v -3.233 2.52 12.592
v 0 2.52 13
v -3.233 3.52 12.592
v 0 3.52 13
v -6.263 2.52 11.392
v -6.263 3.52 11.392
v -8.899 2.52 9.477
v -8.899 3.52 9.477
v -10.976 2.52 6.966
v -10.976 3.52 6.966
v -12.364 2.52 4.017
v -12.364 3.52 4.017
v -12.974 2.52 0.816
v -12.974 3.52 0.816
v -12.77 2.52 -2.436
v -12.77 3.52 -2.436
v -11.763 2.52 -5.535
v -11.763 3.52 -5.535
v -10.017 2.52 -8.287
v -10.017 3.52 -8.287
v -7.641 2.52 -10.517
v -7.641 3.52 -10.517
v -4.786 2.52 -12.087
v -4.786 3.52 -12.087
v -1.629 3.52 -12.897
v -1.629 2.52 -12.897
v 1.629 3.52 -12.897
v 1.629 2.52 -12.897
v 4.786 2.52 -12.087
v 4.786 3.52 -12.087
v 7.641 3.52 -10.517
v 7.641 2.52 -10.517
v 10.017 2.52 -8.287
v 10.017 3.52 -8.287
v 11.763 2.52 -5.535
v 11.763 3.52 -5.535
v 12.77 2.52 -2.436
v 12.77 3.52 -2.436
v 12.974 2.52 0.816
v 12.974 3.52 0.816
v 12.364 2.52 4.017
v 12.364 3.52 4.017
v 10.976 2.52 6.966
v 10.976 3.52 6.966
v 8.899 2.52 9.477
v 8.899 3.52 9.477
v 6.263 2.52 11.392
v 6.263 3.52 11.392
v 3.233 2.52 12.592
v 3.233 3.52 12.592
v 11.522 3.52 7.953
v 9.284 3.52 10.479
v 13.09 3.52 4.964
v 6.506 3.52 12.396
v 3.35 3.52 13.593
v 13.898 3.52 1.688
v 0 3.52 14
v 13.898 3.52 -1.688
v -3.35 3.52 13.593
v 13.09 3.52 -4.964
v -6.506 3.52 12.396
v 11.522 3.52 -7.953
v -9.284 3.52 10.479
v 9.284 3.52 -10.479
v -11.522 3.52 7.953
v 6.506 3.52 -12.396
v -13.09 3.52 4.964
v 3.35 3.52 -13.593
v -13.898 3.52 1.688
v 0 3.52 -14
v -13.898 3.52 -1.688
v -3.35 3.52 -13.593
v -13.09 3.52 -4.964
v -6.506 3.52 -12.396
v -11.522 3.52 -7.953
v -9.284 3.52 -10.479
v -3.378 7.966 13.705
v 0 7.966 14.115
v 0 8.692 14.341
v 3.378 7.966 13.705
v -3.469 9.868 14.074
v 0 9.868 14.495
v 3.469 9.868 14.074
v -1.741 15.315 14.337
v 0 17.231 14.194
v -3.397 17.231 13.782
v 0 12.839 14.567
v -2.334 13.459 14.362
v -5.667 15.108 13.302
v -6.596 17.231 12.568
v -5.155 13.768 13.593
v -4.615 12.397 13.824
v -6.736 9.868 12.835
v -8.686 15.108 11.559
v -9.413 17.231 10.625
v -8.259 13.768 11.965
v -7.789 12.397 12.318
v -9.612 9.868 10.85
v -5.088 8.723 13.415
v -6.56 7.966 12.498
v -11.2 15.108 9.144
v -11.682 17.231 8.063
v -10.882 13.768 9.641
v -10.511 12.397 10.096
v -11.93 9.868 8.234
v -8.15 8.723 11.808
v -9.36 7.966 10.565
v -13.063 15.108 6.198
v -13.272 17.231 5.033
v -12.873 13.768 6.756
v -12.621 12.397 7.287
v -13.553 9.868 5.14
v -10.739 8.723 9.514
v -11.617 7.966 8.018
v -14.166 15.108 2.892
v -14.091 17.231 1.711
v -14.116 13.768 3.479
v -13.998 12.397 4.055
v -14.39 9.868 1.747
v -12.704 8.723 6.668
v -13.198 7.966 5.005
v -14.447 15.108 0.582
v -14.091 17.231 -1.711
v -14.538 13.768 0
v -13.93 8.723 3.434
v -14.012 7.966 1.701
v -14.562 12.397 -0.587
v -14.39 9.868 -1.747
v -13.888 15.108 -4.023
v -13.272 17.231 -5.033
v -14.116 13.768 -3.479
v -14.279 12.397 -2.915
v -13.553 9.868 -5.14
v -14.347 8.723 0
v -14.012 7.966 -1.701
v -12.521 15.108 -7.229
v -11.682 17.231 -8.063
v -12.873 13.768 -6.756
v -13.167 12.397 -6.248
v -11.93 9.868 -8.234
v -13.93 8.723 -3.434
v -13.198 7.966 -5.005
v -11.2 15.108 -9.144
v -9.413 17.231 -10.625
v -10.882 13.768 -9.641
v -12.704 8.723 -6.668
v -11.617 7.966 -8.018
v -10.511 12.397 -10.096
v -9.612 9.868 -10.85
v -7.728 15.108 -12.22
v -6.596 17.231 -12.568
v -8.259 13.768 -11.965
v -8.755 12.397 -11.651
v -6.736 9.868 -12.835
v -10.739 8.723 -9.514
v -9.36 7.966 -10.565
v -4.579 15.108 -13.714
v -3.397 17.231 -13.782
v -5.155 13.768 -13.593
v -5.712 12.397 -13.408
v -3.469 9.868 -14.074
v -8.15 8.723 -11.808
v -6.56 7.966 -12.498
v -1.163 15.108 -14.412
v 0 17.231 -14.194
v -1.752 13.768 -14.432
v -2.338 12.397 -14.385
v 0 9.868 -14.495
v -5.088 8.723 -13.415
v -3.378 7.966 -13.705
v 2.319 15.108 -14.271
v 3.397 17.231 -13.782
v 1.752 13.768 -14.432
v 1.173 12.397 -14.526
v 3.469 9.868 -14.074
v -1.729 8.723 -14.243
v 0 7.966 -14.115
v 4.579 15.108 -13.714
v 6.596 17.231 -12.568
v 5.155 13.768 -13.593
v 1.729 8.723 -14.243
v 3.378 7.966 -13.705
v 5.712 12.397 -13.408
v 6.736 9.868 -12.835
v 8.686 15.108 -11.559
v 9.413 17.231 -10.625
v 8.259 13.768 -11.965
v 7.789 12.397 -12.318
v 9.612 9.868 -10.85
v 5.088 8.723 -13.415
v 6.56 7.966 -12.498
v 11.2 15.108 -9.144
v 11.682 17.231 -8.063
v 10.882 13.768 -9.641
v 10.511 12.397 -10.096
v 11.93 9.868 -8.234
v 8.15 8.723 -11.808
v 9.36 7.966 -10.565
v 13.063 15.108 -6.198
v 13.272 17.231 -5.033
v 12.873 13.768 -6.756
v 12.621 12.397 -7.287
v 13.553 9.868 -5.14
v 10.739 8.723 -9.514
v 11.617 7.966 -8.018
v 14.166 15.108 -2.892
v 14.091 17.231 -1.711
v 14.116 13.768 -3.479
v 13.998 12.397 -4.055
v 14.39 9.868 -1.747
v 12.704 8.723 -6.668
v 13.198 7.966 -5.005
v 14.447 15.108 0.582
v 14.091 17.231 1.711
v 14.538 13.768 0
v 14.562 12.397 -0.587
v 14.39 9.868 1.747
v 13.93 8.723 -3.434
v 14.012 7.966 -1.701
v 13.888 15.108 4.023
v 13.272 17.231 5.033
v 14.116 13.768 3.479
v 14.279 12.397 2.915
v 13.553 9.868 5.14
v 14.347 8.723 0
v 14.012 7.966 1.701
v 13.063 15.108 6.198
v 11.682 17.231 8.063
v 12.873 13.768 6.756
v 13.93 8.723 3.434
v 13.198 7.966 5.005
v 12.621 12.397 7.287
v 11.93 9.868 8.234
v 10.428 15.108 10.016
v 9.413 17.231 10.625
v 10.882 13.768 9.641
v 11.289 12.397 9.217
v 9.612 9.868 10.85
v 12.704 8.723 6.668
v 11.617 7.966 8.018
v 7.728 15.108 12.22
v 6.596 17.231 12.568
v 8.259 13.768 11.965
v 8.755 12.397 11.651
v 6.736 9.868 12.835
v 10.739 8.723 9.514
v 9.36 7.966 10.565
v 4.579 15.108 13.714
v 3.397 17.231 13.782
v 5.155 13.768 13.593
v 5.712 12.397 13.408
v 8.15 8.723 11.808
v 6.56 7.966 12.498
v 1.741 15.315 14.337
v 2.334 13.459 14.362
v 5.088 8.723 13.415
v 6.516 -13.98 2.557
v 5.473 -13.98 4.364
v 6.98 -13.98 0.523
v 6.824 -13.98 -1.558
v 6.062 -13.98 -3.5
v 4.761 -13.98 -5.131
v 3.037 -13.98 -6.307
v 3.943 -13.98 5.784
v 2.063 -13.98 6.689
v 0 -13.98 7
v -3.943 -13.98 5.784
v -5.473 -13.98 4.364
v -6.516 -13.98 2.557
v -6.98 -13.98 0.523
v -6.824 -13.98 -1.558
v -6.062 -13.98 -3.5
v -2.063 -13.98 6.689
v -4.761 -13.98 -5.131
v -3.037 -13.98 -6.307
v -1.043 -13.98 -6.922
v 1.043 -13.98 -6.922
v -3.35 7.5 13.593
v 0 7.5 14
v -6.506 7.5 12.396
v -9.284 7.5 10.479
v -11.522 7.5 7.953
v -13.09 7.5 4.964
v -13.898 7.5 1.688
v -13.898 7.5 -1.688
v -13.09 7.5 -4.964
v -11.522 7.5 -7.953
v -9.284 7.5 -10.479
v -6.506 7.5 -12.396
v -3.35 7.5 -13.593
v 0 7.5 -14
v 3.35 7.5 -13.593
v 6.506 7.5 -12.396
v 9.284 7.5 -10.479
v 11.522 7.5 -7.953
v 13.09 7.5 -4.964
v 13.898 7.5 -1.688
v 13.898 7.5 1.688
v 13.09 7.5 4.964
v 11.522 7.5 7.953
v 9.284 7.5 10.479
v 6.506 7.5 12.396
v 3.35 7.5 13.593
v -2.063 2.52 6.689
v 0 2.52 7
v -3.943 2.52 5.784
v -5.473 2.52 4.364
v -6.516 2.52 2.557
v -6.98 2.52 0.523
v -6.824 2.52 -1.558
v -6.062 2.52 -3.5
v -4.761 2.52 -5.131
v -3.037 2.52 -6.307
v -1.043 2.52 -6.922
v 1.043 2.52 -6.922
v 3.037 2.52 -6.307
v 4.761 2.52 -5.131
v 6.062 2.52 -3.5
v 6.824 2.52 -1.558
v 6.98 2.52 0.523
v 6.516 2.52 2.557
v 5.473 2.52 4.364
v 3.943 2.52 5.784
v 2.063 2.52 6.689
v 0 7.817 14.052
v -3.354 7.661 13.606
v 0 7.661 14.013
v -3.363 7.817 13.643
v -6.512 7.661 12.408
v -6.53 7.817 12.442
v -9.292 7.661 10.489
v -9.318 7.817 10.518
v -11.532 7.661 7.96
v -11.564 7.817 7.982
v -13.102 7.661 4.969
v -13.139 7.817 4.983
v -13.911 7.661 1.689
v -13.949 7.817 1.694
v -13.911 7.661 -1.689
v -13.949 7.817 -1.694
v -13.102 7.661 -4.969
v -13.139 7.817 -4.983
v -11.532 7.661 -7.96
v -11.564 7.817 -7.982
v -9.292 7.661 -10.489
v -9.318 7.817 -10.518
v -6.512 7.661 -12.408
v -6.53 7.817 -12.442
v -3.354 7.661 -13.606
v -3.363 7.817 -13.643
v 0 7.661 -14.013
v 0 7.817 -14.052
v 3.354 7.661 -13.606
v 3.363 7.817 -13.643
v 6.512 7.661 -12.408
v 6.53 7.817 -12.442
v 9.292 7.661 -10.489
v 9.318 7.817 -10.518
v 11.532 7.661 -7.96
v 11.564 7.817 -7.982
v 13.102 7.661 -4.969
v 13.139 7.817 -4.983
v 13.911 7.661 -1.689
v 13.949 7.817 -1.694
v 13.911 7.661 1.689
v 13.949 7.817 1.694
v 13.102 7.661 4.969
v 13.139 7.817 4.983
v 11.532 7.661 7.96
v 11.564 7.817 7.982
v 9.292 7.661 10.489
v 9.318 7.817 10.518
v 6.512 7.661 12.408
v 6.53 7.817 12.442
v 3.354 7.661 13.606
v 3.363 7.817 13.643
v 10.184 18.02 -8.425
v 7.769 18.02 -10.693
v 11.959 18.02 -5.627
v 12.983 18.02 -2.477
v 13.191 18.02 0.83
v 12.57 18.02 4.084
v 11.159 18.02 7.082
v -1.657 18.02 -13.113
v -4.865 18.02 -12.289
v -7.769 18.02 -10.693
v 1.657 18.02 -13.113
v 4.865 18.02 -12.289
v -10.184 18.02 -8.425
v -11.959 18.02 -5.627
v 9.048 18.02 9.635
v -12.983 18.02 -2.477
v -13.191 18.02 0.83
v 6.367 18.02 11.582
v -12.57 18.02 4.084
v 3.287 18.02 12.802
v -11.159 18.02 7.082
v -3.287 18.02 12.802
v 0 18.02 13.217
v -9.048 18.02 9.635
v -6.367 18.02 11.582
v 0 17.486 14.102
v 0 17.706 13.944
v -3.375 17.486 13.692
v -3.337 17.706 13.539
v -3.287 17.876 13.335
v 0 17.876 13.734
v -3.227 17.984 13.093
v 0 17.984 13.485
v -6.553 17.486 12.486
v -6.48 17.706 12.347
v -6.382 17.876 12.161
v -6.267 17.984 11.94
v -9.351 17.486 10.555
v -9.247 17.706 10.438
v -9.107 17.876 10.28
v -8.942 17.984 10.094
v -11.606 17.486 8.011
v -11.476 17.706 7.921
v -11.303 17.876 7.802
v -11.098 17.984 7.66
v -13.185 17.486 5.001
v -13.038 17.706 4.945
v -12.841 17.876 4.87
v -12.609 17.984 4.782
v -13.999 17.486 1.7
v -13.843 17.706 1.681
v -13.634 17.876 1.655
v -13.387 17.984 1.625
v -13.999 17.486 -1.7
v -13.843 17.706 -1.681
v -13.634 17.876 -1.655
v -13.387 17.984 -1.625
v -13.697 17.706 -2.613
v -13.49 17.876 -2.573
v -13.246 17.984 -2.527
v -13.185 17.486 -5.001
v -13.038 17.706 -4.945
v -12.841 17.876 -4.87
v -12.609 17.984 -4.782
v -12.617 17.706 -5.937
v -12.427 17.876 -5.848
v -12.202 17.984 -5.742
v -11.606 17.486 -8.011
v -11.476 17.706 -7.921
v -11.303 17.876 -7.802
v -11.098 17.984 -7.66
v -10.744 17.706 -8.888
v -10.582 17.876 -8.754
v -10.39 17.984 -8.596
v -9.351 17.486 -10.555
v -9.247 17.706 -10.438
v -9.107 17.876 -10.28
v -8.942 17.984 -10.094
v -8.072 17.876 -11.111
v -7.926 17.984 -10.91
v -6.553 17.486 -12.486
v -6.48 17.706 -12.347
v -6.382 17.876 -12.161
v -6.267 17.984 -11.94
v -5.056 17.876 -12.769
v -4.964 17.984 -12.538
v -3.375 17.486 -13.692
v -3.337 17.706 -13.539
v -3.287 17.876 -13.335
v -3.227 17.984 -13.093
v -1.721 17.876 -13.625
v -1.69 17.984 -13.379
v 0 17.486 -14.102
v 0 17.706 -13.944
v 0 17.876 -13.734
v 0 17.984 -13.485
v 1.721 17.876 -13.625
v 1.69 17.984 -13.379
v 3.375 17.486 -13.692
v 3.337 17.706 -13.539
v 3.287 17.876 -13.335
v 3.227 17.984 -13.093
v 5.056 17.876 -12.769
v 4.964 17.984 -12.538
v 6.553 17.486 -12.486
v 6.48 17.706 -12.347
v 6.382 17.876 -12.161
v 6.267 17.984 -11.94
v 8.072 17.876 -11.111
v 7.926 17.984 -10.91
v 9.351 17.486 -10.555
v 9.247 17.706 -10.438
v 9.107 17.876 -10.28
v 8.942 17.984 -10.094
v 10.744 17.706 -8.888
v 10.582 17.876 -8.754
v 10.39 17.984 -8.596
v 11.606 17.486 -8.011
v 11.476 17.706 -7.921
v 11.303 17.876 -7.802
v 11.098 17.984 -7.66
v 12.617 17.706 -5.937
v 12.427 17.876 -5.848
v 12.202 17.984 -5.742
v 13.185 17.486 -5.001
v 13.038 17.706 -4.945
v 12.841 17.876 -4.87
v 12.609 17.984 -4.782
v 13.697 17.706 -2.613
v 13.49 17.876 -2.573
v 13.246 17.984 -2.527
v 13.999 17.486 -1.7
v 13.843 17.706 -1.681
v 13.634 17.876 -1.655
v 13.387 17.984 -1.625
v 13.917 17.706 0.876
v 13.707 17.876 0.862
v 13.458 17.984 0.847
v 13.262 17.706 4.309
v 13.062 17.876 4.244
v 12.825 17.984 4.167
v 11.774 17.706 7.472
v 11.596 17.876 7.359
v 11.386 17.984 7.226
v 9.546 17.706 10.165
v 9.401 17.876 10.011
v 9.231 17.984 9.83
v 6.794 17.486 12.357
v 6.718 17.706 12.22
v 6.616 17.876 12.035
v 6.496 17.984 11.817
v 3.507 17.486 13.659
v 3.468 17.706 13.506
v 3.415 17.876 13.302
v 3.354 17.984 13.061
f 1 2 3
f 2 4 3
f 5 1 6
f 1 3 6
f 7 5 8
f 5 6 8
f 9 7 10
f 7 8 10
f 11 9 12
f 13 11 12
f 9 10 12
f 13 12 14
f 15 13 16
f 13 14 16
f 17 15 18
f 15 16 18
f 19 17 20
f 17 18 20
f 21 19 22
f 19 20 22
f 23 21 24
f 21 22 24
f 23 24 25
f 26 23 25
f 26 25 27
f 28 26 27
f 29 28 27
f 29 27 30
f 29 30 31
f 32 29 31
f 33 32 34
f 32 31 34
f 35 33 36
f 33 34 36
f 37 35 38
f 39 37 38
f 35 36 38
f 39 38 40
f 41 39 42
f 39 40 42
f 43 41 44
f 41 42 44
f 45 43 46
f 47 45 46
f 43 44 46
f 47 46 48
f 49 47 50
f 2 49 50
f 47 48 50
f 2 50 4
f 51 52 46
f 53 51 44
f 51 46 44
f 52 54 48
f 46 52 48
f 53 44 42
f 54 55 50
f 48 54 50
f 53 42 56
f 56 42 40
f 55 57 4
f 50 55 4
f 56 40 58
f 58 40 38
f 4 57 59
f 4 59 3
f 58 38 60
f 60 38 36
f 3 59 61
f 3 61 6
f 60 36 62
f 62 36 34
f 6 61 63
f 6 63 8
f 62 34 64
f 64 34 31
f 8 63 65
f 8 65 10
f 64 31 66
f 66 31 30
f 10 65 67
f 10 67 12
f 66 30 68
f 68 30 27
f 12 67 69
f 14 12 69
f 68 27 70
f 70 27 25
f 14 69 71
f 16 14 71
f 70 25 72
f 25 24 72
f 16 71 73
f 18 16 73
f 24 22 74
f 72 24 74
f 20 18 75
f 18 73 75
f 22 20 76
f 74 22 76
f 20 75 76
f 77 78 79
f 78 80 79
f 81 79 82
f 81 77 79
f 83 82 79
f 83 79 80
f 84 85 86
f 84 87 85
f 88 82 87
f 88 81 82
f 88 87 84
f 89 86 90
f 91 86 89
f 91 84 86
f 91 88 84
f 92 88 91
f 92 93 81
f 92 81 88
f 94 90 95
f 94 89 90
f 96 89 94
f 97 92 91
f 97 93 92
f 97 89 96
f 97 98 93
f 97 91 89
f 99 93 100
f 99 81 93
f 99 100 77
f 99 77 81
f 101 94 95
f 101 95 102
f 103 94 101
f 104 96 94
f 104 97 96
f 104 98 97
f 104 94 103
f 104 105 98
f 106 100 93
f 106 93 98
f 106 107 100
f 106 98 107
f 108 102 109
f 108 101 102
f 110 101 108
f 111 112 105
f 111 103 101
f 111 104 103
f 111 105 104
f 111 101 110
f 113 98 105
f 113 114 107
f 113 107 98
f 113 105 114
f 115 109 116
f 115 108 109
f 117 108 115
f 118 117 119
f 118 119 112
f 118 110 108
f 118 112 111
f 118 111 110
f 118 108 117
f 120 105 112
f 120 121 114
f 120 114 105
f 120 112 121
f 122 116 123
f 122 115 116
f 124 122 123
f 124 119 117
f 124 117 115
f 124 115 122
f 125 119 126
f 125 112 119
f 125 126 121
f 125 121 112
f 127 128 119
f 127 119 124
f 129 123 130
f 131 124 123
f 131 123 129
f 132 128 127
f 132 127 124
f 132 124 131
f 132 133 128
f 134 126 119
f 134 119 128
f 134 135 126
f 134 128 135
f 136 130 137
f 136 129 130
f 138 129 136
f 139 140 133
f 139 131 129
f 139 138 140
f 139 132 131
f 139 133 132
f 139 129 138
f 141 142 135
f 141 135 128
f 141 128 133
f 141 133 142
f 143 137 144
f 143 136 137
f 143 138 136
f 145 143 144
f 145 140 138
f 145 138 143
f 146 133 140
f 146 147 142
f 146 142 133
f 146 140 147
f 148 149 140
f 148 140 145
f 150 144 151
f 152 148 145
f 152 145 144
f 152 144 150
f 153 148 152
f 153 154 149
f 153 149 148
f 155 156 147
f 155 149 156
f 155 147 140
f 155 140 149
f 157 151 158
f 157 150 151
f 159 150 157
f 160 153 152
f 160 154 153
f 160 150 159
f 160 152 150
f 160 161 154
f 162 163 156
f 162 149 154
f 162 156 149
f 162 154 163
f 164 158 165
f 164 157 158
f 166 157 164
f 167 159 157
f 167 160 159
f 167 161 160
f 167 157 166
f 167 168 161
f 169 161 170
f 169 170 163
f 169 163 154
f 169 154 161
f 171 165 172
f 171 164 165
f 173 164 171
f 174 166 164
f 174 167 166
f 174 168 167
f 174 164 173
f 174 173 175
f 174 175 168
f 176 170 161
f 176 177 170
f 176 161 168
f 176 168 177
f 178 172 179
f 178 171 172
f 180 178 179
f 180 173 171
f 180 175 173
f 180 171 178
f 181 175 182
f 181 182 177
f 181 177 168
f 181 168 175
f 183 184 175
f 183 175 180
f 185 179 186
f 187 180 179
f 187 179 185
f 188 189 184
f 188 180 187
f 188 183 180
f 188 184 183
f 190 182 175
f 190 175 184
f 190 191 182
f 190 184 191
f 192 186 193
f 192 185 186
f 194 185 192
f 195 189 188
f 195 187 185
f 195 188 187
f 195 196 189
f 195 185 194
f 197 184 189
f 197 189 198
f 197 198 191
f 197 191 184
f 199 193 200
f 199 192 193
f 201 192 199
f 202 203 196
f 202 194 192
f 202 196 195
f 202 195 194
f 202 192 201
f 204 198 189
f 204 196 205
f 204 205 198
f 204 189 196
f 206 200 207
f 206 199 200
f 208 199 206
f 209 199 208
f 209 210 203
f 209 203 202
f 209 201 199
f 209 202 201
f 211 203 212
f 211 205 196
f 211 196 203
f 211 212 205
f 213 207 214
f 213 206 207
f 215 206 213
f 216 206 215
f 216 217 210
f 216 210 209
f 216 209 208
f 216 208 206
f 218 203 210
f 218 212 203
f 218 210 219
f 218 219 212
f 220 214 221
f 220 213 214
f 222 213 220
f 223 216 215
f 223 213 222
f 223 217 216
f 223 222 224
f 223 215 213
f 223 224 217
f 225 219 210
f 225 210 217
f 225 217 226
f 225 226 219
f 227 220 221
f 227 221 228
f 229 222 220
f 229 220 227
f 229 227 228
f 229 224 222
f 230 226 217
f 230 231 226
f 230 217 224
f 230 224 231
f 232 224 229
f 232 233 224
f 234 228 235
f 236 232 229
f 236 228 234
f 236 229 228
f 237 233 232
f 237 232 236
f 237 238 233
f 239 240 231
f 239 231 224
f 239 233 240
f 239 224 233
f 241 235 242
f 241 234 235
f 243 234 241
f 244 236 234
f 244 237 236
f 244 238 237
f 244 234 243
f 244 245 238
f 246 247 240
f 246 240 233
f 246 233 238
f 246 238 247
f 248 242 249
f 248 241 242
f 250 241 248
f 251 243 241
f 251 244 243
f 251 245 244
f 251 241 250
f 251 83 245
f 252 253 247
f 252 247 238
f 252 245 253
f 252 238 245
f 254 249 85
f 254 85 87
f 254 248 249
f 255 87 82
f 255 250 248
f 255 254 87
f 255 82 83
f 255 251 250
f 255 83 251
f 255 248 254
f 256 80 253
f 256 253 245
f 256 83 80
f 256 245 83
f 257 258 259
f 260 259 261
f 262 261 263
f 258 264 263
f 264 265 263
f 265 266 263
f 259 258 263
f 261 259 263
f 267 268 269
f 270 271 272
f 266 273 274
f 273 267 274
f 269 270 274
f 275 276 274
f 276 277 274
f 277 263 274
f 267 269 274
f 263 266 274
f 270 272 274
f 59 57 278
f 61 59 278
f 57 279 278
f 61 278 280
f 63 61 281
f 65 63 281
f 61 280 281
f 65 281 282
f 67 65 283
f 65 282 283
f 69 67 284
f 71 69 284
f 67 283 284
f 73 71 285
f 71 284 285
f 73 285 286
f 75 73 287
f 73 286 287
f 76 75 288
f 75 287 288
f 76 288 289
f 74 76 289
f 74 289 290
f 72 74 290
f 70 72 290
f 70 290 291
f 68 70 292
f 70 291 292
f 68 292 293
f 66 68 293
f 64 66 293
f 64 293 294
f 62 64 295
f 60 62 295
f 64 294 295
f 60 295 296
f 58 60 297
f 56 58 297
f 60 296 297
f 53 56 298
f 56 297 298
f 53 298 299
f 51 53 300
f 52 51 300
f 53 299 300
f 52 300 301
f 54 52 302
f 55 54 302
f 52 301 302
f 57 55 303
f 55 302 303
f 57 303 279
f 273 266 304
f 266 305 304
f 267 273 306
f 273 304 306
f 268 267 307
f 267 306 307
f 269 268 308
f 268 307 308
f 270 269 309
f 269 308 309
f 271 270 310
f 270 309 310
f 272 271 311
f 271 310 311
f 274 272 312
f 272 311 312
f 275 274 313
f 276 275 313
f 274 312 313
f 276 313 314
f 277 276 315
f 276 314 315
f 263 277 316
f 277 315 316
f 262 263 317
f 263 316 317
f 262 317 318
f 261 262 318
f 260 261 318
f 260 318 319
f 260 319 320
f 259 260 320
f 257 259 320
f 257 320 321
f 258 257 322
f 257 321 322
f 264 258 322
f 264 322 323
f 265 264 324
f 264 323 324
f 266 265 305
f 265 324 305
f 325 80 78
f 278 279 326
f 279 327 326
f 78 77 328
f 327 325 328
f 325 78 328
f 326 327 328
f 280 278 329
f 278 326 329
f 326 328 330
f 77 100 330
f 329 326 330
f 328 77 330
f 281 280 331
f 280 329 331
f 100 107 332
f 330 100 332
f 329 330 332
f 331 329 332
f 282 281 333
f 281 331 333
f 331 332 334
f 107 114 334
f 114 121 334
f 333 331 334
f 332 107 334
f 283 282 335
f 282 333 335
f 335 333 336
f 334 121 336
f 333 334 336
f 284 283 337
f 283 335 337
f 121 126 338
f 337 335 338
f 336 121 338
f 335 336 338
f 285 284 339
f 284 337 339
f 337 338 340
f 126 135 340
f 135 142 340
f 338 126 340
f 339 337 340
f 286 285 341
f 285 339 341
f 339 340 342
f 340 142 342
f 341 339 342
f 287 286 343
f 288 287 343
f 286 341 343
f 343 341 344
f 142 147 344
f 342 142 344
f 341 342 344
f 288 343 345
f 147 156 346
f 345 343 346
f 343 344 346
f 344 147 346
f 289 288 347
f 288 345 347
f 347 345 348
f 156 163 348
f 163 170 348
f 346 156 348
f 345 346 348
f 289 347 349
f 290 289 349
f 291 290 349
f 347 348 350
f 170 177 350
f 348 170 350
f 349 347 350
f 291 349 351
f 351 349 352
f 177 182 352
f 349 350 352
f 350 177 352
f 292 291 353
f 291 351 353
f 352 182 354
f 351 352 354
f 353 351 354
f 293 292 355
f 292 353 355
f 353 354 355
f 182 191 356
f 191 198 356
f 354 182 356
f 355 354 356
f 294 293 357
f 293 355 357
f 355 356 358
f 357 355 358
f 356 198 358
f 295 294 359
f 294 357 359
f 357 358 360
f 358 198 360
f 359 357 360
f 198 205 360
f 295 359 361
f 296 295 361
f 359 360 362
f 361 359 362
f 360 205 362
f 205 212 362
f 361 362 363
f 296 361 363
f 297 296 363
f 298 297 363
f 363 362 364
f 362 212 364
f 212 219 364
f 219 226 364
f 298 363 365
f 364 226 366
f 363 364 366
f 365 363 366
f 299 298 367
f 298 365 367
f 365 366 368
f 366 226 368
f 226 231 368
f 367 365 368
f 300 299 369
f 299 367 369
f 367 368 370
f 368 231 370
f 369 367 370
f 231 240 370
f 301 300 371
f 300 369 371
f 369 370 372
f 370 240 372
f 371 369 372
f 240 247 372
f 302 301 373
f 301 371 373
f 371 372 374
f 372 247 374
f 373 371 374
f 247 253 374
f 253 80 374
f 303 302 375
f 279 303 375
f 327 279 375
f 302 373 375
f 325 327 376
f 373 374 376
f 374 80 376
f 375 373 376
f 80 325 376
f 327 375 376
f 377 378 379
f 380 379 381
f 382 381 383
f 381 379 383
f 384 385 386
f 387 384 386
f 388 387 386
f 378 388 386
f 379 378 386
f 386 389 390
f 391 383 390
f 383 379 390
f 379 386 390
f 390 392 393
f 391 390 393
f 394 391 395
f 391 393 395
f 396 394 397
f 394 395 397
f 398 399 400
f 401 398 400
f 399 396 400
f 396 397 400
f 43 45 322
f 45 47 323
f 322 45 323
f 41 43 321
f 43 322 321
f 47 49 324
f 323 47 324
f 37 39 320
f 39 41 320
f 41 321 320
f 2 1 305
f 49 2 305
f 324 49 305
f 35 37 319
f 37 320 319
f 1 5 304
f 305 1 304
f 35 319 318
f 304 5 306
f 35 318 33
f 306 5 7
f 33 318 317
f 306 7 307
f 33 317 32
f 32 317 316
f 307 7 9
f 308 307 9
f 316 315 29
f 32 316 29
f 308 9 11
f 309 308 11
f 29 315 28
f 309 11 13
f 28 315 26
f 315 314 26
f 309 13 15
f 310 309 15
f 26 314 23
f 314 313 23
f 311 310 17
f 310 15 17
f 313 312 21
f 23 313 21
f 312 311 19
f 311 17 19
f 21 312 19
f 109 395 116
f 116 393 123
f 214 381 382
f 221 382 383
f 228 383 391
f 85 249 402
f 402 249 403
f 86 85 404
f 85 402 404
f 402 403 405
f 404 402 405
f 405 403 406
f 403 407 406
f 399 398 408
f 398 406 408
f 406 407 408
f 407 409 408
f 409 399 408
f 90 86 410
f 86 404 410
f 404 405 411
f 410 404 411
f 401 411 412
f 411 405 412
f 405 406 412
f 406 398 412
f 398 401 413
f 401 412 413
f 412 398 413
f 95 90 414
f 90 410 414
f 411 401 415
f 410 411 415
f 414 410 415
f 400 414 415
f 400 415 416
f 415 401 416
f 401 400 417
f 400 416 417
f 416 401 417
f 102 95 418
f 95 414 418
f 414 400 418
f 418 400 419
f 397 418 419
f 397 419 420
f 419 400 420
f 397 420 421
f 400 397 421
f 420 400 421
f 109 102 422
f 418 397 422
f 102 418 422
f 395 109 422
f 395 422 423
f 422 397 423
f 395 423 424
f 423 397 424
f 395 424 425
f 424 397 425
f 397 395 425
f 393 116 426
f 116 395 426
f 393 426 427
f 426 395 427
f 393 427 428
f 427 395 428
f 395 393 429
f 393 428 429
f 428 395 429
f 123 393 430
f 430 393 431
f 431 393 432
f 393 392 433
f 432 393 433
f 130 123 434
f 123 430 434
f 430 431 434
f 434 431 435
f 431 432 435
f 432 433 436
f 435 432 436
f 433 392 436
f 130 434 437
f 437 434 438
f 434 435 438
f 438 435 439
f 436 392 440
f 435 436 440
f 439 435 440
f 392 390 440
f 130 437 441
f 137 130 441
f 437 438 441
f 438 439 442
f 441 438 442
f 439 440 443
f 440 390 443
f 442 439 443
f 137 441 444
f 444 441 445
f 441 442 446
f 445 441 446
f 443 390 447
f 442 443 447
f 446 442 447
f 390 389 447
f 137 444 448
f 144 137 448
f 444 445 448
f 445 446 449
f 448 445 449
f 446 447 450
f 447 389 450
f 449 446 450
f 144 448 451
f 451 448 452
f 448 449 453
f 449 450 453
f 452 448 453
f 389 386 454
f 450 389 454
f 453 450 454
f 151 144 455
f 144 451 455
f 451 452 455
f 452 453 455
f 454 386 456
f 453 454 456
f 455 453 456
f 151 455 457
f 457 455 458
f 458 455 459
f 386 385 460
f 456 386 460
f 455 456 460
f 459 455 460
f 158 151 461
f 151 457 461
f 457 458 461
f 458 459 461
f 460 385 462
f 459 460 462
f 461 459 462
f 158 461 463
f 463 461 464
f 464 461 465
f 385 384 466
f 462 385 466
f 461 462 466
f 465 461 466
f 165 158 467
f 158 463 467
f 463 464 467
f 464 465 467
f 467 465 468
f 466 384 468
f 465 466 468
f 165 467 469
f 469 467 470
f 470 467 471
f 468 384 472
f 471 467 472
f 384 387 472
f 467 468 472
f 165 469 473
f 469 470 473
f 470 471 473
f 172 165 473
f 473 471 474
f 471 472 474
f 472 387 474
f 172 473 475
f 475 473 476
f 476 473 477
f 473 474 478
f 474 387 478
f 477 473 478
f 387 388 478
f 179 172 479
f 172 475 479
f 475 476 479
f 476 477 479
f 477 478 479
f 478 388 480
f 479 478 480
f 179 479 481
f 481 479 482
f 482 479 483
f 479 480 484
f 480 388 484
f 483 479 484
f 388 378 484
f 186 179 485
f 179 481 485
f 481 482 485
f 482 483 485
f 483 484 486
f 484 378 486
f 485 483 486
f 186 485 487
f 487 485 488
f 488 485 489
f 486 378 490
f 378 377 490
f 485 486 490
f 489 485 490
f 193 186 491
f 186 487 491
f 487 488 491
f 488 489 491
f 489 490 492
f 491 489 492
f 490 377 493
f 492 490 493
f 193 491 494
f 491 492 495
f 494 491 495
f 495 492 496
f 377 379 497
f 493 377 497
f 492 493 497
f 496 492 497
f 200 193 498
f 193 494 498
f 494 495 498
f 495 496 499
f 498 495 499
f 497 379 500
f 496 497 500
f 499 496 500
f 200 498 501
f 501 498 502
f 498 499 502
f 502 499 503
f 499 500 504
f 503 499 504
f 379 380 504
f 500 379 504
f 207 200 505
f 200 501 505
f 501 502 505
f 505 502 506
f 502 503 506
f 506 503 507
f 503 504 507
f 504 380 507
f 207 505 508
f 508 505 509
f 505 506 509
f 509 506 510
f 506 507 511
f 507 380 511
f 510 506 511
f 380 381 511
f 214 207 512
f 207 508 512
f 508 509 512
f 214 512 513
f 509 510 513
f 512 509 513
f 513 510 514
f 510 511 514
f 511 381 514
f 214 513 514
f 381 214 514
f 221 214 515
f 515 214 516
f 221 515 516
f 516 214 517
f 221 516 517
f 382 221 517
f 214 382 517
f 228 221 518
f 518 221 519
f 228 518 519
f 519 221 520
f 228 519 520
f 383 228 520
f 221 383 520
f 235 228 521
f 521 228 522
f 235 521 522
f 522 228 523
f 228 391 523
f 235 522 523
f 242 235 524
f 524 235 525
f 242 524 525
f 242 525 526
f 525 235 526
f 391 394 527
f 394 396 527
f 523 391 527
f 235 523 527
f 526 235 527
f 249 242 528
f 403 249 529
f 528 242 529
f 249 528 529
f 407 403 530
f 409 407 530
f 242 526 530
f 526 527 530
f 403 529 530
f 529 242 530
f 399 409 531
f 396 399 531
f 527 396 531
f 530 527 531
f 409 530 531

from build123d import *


with BuildPart() as part:
    # Esquisse1 → BASE (revolve)
    with BuildSketch(Plane(origin=(0, 0, 0), x_dir=(0, 0, -1), z_dir=(1, 0, 0)), mode=Mode.PRIVATE) as base_sk:
        with BuildLine():
            Line((0, 18.02020202), (0, -13.97979798))
            Line((0, -13.97979798), (7, -13.97979798))
            Line((7, -13.97979798), (7, 2.52020202))
            Line((7, 2.52020202), (13, 2.52020202))
            Line((13, 2.52020202), (13, 3.52020202))
            Line((13, 3.52020202), (14, 3.52020202))
            Line((14, 3.52020202), (14, 7.499692708))
            ThreePointArc((14, 7.499692708), (14.029220483, 7.739665891), (14.115174257, 7.965614809))
            add(Edge.make_bspline(
                [(14.194254849, 17.231489647), (14.32439859, 16.629440159), (14.692921365, 13.153711655), (14.580413451, 8.849143653), (14.115174257, 7.965614809)],
                knots=[0.108898925, 0.108898925, 0.108898925, 0.108898925, 0.358245971, 0.953924024, 0.953924024, 0.953924024, 0.953924024], degree=3))
            ThreePointArc((14.194254849, 17.231489647), (13.844808774, 17.798433228), (13.216830919, 18.02020202))
            Line((13.216830919, 18.02020202), (0, 18.02020202))
        make_face()
    revolve(base_sk.sketch.rotate(Axis((0, 23.353535354, 0), (0, -1, 0)), 180), axis=Axis((0, 23.353535354, 0), (0, -1, 0)))


solid = part.part
